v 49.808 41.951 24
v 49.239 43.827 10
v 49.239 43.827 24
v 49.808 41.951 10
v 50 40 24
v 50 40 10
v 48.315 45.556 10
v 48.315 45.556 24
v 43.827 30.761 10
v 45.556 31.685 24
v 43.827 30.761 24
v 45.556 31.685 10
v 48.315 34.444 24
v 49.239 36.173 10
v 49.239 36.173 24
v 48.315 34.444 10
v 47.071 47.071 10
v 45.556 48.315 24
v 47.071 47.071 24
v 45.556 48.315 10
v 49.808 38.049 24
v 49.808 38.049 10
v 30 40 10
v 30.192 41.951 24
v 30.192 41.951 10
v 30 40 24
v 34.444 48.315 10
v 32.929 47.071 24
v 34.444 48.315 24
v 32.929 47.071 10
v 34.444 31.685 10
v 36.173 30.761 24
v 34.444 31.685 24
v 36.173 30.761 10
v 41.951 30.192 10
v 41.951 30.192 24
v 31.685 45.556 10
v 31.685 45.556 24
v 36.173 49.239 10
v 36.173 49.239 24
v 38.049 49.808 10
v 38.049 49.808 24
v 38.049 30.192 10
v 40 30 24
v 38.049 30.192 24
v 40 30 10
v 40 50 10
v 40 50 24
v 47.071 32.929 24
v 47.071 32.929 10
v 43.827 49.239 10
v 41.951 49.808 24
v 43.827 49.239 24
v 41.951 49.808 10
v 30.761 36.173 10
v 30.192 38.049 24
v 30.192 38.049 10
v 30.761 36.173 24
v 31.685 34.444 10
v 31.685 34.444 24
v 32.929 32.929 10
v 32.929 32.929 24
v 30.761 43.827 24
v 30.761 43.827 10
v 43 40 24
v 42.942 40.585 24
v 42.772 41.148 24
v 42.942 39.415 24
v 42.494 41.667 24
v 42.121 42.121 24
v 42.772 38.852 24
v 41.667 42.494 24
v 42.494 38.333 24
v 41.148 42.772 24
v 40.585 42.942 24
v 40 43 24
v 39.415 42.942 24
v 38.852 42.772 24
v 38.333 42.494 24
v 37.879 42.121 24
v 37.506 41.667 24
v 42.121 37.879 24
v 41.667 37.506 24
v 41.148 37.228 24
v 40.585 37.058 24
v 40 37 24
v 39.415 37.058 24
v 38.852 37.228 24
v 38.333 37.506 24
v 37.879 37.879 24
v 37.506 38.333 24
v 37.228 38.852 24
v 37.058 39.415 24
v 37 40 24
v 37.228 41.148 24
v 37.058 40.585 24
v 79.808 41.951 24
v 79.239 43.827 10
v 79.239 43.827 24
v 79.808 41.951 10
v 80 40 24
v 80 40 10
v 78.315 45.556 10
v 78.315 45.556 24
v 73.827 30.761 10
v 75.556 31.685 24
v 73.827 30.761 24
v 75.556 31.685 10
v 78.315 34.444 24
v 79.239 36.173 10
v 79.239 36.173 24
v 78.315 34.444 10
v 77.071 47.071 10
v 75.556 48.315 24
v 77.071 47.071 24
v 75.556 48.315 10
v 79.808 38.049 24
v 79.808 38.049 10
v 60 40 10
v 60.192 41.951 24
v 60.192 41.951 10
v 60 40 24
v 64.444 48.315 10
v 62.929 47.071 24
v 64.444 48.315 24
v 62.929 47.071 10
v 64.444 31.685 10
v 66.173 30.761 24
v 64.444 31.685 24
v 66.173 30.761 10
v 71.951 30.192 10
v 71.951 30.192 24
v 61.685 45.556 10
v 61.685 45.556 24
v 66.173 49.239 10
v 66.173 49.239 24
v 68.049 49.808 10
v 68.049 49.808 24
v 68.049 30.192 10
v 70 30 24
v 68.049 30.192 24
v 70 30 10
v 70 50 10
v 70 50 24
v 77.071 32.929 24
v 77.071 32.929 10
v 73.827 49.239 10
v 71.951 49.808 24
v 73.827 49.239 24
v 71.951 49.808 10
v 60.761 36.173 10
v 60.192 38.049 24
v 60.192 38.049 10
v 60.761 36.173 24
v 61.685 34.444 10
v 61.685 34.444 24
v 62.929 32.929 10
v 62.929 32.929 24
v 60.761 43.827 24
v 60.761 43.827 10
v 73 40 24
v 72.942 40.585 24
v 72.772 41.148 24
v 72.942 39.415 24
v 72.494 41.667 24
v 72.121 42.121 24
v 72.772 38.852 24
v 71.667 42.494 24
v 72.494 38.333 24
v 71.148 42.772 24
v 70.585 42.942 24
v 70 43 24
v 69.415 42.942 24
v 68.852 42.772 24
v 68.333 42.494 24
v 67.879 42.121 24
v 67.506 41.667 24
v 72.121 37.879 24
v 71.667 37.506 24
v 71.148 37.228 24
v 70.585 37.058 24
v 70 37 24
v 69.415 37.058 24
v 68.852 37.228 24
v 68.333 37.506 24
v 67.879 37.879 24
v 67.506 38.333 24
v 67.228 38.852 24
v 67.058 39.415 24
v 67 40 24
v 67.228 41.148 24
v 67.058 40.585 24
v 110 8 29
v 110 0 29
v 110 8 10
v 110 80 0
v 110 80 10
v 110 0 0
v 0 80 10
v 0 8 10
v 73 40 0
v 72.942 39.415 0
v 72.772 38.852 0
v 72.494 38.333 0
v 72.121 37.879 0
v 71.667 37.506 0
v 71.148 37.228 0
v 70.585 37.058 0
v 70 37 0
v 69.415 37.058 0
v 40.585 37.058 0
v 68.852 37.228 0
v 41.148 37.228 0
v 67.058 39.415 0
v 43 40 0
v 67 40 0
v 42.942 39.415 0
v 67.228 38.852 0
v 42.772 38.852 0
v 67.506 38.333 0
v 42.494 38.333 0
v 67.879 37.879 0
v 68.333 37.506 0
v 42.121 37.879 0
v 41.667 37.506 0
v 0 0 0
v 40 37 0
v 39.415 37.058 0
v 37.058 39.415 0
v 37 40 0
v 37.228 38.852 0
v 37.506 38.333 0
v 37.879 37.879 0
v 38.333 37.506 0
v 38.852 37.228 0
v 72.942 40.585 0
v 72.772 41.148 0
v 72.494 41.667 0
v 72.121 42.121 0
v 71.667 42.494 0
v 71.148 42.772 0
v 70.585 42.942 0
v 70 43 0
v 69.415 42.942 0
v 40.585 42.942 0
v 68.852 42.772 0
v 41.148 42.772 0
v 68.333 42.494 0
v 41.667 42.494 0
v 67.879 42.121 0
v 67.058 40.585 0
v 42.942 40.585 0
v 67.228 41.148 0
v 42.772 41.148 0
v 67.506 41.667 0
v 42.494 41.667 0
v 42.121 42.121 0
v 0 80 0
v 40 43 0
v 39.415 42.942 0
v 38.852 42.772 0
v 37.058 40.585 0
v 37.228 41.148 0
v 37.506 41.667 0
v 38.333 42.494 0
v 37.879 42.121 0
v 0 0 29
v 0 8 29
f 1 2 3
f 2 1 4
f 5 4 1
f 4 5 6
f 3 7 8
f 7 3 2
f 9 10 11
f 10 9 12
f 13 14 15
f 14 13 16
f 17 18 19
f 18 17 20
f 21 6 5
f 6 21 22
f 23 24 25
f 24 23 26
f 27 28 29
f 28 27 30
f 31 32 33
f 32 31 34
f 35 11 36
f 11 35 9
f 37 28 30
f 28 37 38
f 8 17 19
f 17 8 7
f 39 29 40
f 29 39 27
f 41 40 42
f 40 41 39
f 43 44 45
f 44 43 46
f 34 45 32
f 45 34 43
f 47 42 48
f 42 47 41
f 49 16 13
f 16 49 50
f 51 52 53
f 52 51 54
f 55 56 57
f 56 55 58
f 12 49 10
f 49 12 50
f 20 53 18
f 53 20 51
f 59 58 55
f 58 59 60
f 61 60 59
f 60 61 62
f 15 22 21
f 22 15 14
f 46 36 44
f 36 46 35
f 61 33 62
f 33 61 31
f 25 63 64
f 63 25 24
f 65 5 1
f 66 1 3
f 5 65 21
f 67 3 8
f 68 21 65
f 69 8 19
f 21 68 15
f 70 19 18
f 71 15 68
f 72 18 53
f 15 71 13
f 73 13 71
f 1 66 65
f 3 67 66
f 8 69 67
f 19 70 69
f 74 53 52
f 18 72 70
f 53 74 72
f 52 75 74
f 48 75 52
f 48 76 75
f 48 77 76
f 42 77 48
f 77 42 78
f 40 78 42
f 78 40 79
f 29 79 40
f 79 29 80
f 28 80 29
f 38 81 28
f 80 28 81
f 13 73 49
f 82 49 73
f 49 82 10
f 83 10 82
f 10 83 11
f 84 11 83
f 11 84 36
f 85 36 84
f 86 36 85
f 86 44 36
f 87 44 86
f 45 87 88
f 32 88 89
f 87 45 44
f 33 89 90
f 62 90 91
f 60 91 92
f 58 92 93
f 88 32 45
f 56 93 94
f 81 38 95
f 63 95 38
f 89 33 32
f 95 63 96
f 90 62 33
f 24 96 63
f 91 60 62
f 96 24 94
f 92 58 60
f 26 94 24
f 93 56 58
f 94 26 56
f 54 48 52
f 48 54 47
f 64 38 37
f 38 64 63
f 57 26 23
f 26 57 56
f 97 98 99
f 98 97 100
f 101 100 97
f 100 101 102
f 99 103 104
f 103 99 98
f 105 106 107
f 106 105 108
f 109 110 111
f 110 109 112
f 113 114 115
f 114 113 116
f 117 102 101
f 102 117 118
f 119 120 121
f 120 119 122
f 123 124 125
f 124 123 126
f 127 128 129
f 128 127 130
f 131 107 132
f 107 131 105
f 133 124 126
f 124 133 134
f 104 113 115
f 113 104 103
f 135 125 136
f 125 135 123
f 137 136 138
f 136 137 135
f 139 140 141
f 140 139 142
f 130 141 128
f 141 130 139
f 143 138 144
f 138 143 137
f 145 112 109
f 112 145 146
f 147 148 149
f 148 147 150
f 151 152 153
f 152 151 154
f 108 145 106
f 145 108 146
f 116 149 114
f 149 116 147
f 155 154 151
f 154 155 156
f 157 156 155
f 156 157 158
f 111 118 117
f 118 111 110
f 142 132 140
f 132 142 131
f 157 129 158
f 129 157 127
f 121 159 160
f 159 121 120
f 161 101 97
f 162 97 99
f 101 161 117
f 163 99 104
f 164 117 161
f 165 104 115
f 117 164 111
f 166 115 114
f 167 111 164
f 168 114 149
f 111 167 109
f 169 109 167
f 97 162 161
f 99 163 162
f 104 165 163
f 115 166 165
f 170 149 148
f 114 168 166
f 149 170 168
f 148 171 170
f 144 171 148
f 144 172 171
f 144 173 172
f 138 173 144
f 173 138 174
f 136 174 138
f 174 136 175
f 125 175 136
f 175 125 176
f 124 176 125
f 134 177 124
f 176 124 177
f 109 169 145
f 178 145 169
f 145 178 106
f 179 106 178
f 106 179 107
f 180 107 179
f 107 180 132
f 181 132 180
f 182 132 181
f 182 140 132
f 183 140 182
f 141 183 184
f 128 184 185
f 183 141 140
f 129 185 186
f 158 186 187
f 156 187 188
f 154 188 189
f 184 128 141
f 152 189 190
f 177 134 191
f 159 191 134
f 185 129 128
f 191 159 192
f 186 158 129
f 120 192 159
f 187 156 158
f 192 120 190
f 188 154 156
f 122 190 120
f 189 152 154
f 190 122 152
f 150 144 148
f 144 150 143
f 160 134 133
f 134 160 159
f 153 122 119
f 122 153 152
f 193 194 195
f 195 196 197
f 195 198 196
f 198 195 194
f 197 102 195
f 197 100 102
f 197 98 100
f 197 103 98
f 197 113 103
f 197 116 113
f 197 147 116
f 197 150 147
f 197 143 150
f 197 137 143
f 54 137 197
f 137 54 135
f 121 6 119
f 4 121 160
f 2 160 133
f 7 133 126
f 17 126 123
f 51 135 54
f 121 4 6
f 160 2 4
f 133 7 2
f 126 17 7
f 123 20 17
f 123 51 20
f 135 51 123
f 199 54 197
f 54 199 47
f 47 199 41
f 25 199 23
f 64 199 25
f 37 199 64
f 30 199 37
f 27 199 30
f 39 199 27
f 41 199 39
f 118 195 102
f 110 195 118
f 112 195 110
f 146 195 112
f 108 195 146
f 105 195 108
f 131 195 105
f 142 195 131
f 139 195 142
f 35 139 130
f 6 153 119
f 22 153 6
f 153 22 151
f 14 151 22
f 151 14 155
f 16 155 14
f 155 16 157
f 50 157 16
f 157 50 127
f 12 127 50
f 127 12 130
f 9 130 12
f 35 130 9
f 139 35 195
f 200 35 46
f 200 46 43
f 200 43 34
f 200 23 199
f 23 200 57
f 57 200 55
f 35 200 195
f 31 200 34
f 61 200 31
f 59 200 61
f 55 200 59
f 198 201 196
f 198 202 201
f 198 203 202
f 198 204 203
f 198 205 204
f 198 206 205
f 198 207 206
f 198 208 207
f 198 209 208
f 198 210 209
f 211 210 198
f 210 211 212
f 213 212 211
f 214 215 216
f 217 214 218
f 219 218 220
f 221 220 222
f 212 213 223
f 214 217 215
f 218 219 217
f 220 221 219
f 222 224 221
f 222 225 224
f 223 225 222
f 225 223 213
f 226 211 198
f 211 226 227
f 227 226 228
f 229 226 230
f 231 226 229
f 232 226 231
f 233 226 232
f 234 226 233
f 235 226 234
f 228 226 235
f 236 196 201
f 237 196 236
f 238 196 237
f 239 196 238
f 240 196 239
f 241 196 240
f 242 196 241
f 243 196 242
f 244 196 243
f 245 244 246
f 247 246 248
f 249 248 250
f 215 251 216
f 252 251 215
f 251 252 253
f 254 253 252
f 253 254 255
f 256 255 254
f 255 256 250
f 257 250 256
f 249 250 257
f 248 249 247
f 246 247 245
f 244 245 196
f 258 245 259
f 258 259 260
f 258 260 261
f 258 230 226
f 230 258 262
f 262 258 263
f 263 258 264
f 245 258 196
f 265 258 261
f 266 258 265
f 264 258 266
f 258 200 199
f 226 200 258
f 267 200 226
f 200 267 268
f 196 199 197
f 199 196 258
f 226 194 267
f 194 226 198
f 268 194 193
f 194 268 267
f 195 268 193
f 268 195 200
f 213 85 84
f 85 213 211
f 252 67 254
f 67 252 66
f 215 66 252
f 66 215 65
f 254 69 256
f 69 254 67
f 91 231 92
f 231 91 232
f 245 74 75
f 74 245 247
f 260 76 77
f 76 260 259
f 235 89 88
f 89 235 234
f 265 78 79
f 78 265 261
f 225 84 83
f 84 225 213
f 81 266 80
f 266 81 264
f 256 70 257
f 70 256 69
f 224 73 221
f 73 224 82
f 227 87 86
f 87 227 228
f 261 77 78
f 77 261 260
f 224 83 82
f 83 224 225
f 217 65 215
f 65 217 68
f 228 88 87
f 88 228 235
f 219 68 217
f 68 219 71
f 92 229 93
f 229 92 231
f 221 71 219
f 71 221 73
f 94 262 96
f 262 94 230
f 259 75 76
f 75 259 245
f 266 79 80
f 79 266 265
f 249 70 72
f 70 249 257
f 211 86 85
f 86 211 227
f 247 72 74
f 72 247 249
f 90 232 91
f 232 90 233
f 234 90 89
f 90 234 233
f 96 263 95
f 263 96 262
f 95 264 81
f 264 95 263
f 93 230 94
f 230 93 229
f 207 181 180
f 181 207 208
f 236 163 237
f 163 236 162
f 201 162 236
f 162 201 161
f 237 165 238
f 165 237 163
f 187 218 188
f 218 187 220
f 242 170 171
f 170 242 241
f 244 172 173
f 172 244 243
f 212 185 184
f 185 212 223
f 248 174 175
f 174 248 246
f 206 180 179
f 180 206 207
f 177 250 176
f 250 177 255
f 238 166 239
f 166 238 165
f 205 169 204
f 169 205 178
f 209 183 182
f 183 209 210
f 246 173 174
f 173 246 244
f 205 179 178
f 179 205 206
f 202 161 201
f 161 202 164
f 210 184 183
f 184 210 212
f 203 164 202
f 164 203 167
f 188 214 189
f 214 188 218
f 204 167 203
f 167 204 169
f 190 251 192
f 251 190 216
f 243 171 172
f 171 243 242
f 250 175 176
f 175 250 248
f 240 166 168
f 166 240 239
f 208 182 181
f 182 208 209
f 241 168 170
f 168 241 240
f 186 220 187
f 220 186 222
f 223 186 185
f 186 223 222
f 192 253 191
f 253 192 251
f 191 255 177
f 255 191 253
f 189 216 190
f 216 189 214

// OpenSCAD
$fn = 32;

// ----------------------------------------------------------------------
// Drill jig: fence jig
// ----------------------------------------------------------------------

// --- parameters (mm) ---
plate_l = 110;            // plate length, X
plate_w = 80;             // plate width, Y
plate_t = 10;             // plate thickness
boss_d = 20;              // guide boss diameter
boss_h = 15;              // boss height above the plate
guide_d = 6;              // guide hole diameter
boss_pitch = 30;          // boss pitch
fence_h = 20;             // fence height above the plate
fence_t = 8;              // fence thickness

n_boss = 2;  // guide bosses
boss_x0 = (plate_l - (n_boss - 1) * boss_pitch) / 2;  // first boss X
boss_top = plate_t - 1 + boss_h;  // boss crown height
fence_top = plate_t - 1 + fence_h;  // fence crown height
total_h = max([fence_top, boss_top]);  // overall height

difference() {
  union() {
  cube([plate_l, plate_w, plate_t]);
  for (i = [0 : n_boss - 1])
    translate([boss_x0 + i * boss_pitch, plate_w / 2, plate_t - 1])
      cylinder(h = boss_h, d = boss_d);
  translate([0, 0, plate_t - 1]) cube([plate_l, fence_t, fence_h]);
  }
  for (i = [0 : n_boss - 1])
    translate([boss_x0 + i * boss_pitch, plate_w / 2, -1])
      cylinder(h = plate_t + boss_h, d = guide_d);
}
